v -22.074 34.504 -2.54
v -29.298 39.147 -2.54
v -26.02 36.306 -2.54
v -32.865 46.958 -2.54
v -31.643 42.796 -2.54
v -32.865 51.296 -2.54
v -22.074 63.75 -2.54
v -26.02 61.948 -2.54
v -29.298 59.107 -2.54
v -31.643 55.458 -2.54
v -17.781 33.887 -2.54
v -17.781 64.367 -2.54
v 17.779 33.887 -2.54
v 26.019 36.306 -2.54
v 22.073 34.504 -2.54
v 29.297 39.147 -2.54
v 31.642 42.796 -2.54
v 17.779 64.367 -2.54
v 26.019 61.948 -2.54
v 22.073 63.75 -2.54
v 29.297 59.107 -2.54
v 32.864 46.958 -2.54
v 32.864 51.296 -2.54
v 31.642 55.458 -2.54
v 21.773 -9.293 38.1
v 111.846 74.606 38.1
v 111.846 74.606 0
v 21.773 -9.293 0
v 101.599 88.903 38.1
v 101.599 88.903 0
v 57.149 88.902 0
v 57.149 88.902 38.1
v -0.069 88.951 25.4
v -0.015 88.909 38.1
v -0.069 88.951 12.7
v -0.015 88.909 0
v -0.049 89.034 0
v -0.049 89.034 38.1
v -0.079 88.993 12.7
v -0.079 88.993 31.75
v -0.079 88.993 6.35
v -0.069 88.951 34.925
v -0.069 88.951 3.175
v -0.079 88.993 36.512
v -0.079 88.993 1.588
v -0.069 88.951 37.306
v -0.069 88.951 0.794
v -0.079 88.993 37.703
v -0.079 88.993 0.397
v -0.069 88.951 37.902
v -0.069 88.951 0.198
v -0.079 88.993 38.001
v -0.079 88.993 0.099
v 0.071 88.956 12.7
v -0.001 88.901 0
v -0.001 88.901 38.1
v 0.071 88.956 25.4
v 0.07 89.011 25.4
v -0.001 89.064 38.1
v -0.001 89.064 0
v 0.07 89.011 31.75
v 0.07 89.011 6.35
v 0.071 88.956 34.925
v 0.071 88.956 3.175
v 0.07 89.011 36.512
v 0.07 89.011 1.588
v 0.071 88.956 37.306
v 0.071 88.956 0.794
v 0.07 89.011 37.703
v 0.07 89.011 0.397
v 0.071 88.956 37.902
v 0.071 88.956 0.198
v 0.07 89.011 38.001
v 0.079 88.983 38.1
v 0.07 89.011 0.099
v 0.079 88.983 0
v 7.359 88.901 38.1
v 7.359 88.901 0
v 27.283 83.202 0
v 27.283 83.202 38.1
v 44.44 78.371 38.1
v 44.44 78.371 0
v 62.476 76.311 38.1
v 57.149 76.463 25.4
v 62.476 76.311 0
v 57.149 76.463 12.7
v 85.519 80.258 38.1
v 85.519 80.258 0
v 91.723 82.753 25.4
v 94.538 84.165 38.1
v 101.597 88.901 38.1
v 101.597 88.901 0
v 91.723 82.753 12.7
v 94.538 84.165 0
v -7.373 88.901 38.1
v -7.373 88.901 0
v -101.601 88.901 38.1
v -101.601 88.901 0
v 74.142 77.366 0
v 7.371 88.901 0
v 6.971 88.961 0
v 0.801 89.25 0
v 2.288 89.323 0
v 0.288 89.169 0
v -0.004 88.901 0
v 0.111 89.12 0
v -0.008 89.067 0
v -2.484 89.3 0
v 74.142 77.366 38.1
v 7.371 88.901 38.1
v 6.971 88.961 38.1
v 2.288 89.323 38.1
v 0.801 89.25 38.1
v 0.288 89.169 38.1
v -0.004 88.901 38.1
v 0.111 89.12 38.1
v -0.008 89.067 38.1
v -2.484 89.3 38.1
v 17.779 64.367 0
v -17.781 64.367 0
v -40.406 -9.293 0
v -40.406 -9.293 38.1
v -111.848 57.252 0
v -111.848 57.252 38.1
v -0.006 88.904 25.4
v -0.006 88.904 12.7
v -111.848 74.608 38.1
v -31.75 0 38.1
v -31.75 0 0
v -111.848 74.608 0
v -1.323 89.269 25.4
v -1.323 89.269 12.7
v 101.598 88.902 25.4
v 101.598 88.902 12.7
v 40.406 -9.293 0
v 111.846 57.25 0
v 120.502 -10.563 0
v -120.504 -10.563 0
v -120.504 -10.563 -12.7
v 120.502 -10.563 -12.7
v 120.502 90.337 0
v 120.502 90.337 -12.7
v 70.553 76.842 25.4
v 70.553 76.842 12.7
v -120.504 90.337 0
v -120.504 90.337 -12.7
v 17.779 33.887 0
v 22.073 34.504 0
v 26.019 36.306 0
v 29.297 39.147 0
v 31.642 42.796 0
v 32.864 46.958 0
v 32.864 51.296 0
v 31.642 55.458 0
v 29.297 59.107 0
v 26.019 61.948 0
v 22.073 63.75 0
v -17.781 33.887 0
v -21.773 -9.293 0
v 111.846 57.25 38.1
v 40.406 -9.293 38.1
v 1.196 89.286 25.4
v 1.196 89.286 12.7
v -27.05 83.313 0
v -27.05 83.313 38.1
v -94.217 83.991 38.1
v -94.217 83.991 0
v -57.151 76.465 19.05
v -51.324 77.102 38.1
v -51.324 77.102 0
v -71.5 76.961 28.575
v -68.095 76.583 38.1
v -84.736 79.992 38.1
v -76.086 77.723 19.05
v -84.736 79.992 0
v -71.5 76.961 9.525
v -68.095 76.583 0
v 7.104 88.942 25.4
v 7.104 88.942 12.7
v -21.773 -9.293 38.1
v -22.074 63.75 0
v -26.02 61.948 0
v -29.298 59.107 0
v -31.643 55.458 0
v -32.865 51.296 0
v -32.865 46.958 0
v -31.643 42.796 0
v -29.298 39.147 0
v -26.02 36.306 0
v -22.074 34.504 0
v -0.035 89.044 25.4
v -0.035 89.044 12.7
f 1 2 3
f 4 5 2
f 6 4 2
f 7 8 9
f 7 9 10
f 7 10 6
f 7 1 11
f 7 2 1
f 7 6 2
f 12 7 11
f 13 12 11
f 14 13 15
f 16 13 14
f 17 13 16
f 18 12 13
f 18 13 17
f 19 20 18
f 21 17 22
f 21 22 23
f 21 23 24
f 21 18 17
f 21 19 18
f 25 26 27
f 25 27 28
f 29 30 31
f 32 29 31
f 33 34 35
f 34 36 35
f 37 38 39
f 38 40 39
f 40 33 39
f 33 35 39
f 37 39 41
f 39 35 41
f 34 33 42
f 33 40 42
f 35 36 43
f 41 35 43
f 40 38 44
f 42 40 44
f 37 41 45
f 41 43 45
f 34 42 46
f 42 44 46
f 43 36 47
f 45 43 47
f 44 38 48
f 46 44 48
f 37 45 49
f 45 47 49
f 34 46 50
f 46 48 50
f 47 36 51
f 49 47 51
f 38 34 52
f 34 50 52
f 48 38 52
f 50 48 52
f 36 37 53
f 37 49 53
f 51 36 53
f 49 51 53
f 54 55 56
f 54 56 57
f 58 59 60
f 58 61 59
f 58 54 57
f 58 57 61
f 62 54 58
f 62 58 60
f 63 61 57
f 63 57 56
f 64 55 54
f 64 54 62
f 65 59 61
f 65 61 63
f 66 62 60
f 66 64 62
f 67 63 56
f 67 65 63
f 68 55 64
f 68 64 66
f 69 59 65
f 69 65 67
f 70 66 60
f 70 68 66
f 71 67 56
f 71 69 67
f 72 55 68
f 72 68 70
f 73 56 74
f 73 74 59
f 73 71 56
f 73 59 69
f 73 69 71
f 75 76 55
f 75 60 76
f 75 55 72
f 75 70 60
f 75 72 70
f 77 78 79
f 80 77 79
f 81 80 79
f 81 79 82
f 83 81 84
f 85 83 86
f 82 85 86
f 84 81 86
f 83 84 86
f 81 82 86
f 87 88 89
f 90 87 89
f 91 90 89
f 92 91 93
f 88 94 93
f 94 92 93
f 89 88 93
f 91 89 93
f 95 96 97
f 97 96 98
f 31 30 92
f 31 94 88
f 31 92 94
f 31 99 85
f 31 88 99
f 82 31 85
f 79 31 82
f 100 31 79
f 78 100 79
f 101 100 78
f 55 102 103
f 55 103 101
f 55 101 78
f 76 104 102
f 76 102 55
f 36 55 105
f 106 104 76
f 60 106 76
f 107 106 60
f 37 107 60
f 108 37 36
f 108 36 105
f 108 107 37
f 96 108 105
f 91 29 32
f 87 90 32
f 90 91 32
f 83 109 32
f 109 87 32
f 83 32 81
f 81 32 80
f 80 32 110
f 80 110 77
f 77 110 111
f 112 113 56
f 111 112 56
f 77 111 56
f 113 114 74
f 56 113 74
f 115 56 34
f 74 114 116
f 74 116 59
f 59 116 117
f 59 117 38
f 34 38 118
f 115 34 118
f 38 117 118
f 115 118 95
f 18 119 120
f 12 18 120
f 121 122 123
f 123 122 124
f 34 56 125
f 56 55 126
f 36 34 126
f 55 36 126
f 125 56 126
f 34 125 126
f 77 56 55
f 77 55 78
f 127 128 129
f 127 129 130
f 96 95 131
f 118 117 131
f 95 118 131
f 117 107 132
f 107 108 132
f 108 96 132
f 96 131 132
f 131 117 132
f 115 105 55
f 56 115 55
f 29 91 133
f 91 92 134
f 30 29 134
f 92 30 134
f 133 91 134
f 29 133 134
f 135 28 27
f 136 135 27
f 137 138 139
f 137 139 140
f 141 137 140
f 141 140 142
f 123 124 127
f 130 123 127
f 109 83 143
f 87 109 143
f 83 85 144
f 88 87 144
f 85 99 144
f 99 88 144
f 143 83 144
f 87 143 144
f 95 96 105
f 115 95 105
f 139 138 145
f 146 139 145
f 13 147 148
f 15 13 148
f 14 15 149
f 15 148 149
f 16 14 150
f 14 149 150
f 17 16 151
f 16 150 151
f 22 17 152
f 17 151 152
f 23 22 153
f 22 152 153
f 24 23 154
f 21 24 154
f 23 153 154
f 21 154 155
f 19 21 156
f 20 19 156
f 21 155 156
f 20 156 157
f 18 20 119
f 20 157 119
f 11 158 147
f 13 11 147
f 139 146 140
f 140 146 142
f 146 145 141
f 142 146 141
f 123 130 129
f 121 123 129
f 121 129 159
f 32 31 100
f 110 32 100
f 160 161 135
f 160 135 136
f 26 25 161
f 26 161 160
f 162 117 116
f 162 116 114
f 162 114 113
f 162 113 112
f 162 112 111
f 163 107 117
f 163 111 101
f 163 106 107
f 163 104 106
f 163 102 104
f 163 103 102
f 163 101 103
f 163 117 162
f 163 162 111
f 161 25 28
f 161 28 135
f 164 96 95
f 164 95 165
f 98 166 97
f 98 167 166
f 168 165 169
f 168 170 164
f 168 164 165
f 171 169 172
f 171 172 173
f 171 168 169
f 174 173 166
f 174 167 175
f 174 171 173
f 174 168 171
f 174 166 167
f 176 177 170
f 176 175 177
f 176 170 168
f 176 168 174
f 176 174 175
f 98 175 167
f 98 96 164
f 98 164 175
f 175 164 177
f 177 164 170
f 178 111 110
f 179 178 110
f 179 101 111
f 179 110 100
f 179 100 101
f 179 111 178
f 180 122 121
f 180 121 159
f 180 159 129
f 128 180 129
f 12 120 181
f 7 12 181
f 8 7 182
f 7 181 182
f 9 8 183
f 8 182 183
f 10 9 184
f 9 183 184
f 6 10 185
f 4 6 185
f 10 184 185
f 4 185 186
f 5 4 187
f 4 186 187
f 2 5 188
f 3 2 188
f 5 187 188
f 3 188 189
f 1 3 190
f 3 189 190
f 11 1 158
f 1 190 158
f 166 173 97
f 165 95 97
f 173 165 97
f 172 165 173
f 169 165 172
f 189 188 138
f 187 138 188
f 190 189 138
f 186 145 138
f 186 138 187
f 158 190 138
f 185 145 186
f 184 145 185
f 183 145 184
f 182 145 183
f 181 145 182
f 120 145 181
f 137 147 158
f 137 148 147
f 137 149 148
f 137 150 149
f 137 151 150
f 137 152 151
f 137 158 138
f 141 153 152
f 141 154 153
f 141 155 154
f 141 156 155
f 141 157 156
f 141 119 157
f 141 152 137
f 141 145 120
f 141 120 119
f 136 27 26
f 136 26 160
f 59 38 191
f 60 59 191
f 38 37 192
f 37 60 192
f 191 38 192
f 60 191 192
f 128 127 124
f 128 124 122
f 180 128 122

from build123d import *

# Parameters (mm, degrees)
F1_DEPTH         = 38.1
F2_E3_MIRRORCS_W = 109.4597315367
F2_E3_MIRRORCS_H = 38.1
F3_DEPTH         = 12.7
F2_E1_W          = 109.4624810587
F2_E1_H          = 38.1
F4_DEPTH         = 12.7
F6_DEPTH         = 38.1
F8_DEPTH         = 38.1
F9_W             = 241.0063309582
F9_H             = 100.9000240942
F10_DEPTH        = 12.7
F12_DEPTH        = 2.54
F14_DEPTH        = 38.1
F16_DEPTH        = 38.1


with BuildPart() as f1:
    # F0 (on Top) → F1 (new body)
    with BuildSketch(Plane.XY):
        with BuildLine():
            add(Edge.make_bspline(
                [(-7.3731541722, 88.9010522698), (-19.31236057, 87.050708456), (-56.3966234299, 68.9261750439), (-92.6223703207, 81.2413929209), (-101.6011297031, 88.9010522698)],
                knots=[0.1289921189, 0.1289921189, 0.1289921189, 0.1289921189, 0.4692924446, 0.7920589848, 0.7920589848, 0.7920589848, 0.7920589848], degree=3))
            Line((-7.3731541722, 88.9010522698), (-57.1511297031, 88.9010522698))
            Line((-57.1511297031, 88.9010522698), (-101.6011297031, 88.9010522698))
        make_face()
        with BuildLine():
            add(Edge.make_bspline(
                [(-0.0011297031, 88.9010522698), (-0.0010471723, 88.901093798), (-0.0009647066, 88.9011353269), (-0.0008823061, 88.9011768563)],
                knots=[0, 0, 0, 0, 1.61298e-05, 1.61298e-05, 1.61298e-05, 1.61298e-05], degree=3))
            Line((-0.0011297031, 88.9010522698), (-0.0006349067, 88.9010522698))
            add(Edge.make_bspline(
                [(-0.0006349067, 88.9010522747), (-0.0007174383, 88.9010938013), (-0.0007999048, 88.9011353285), (-0.0008823061, 88.9011768563)],
                knots=[0, 0, 0, 0, 1.61298e-05, 1.61298e-05, 1.61298e-05, 1.61298e-05], degree=3))
        make_face()
        with BuildLine():
            Line((-0.0038189409, 88.9010522698), (-0.0011297031, 88.9010522698))
            add(Edge.make_bspline(
                [(-0.0011297031, 88.9010522698), (-0.0010471723, 88.901093798), (-0.0009647066, 88.9011353269), (-0.0008823061, 88.9011768563)],
                knots=[0, 0, 0, 0, 1.61298e-05, 1.61298e-05, 1.61298e-05, 1.61298e-05], degree=3))
            add(Edge.make_bspline(
                [(-0.0008823061, 88.9011768563), (-0.0059560813, 88.9037338865), (-0.0107828824, 88.9062931167), (-0.0153641459, 88.9088540413)],
                knots=[1.61298e-05, 1.61298e-05, 1.61298e-05, 1.61298e-05, 0.0010093075, 0.0010093075, 0.0010093075, 0.0010093075], degree=3))
            add(Edge.make_bspline(
                [(-0.0038189409, 88.9010522698), (-0.0078539791, 88.9036552478), (-0.0117020651, 88.9062559427), (-0.0153641459, 88.9088540413)],
                knots=[0.0002095209, 0.0002095209, 0.0002095209, 0.0002095209, 0.001082787, 0.001082787, 0.001082787, 0.001082787], degree=3))
        make_face()
        with BuildLine():
            Line((-7.3731541722, 88.9010522698), (-0.0038189409, 88.9010522698))
            add(Edge.make_bspline(
                [(-0.0038189409, 88.9010522698), (-0.0078539791, 88.9036552478), (-0.0117020651, 88.9062559427), (-0.0153641459, 88.9088540413)],
                knots=[0.0002095209, 0.0002095209, 0.0002095209, 0.0002095209, 0.001082787, 0.001082787, 0.001082787, 0.001082787], degree=3))
            add(Edge.make_bspline(
                [(-0.0153641459, 88.9088540413), (-0.0906066198, 88.9509145567), (-0.0996162199, 88.9934321228), (-0.0487573192, 89.0341663757)],
                knots=[0.0010093075, 0.0010093075, 0.0010093075, 0.0010093075, 0.0173212144, 0.0173212144, 0.0173212144, 0.0173212144], degree=3))
            add(Edge.make_bspline(
                [(-0.0487573192, 89.0341663757), (-0.0385667228, 89.045259585), (-0.0248162276, 89.0561903305), (-0.0075963078, 89.0669286912)],
                knots=[0.0155197372, 0.0155197372, 0.0155197372, 0.0155197372, 0.0195117913, 0.0195117913, 0.0195117913, 0.0195117913], degree=3))
            add(Edge.make_bspline(
                [(-0.0075963078, 89.0669286912), (-0.5527500342, 89.3272580379), (-3.6107471198, 89.4841518814), (-7.3731541722, 88.9010522698)],
                knots=[0.0217531364, 0.0217531364, 0.0217531364, 0.0217531364, 0.1289921189, 0.1289921189, 0.1289921189, 0.1289921189], degree=3))
        make_face()
        with BuildLine():
            Line((7.358503656, 88.9011983473), (-0.0006349067, 88.9010522747))
            Line((-0.0006349067, 88.9010522698), (7.3594185793, 88.9010522698))
            add(Edge.make_bspline(
                [(7.358503656, 88.9011983473), (7.3588086257, 88.9011496596), (7.3591136001, 88.9011009671), (7.3594185793, 88.9010522698)],
                knots=[0.1288715075, 0.1288715075, 0.1288715075, 0.1288715075, 0.1288802405, 0.1288802405, 0.1288802405, 0.1288802405], degree=3))
        make_face()
        with BuildLine():
            add(Edge.make_bspline(
                [(-0.0006349067, 88.9010522747), (-0.0007174383, 88.9010938013), (-0.0007999048, 88.9011353285), (-0.0008823061, 88.9011768563)],
                knots=[0, 0, 0, 0, 1.61298e-05, 1.61298e-05, 1.61298e-05, 1.61298e-05], degree=3))
            Line((-0.0006349067, 88.9010522747), (7.358503656, 88.9011983473))
            add(Edge.make_bspline(
                [(6.9707545503, 88.9609054579), (7.0990916617, 88.9418687773), (7.2283658962, 88.9219745203), (7.358503656, 88.9011983473)],
                knots=[0.1251449345, 0.1251449345, 0.1251449345, 0.1251449345, 0.1288715075, 0.1288715075, 0.1288715075, 0.1288715075], degree=3))
            add(Edge.make_bspline(
                [(-0.0008839186, 89.0636547943), (0.5066620671, 89.3166069603), (3.3780640661, 89.4750941094), (6.9707545503, 88.9609054579)],
                knots=[0.0213043311, 0.0213043311, 0.0213043311, 0.0213043311, 0.1251592971, 0.1251592971, 0.1251592971, 0.1251592971], degree=3))
            add(Edge.make_bspline(
                [(-0.0008823061, 88.9011768563), (0.1078701091, 88.9559875108), (0.1031539373, 89.0118066991), (-0.0008839186, 89.0636547943)],
                knots=[1.61298e-05, 1.61298e-05, 1.61298e-05, 1.61298e-05, 0.0213043311, 0.0213043311, 0.0213043311, 0.0213043311], degree=3))
        make_face()
        with BuildLine():
            add(Edge.make_bspline(
                [(7.358503656, 88.9011983473), (7.3588086257, 88.9011496596), (7.3591136001, 88.9011009671), (7.3594185793, 88.9010522698)],
                knots=[0.1288715075, 0.1288715075, 0.1288715075, 0.1288715075, 0.1288802405, 0.1288802405, 0.1288802405, 0.1288802405], degree=3))
            Line((7.3594185793, 88.9010522698), (7.372333804, 88.9010522698))
            add(Edge.make_bspline(
                [(7.371389561, 88.901198603), (7.3717043037, 88.9011498305), (7.3720190514, 88.9011010527), (7.372333804, 88.9010522698)],
                knots=[0.1289921189, 0.1289921189, 0.1289921189, 0.1289921189, 0.1290010899, 0.1290010899, 0.1290010899, 0.1290010899], degree=3))
            Line((7.371389561, 88.901198603), (7.358503656, 88.9011983473))
        make_face()
        with BuildLine():
            Line((7.372333804, 88.9010522698), (7.3594185793, 88.9010522698))
            add(Edge.make_bspline(
                [(7.3594185793, 88.9010522698), (7.3633256696, 88.9004284077), (19.2537900005, 86.9997857358), (40.134248152, 76.8571245778), (60.7081186709, 76.2938170337), (62.4758923018, 76.3111989879)],
                knots=[0.1288802405, 0.1288802405, 0.1288802405, 0.1288802405, 0.1289921189, 0.4692924446, 0.5014907397, 0.5014907397, 0.5014907397, 0.5014907397], degree=3))
            add(Edge.make_bspline(
                [(7.372333804, 88.9010522698), (19.311636162, 87.0506013639), (40.1454385751, 76.8690456691), (60.7080947753, 76.2945495342), (62.4758923018, 76.3111989879)],
                knots=[0.1290010899, 0.1290010899, 0.1290010899, 0.1290010899, 0.4692924446, 0.5015061184, 0.5015061184, 0.5015061184, 0.5015061184], degree=3))
        make_face()
        with BuildLine():
            add(Edge.make_bspline(
                [(6.9707545503, 88.9609054579), (7.0990916617, 88.9418687773), (7.2283658962, 88.9219745203), (7.358503656, 88.9011983473)],
                knots=[0.1251449345, 0.1251449345, 0.1251449345, 0.1251449345, 0.1288715075, 0.1288715075, 0.1288715075, 0.1288715075], degree=3))
            Line((7.358503656, 88.9011983473), (7.371389561, 88.901198603))
            add(Edge.make_bspline(
                [(6.9707545503, 88.9609054579), (7.103344668, 88.9419290573), (7.2369171933, 88.9220364605), (7.371389561, 88.901198603)],
                knots=[0.1251592971, 0.1251592971, 0.1251592971, 0.1251592971, 0.1289921189, 0.1289921189, 0.1289921189, 0.1289921189], degree=3))
        make_face()
        with BuildLine():
            add(Edge.make_bspline(
                [(-0.0487573192, 89.0341663757), (-0.0363383579, 89.0441130537), (-0.0203496698, 89.0539533996), (-0.0008839186, 89.0636547943)],
                knots=[0.0173212144, 0.0173212144, 0.0173212144, 0.0173212144, 0.0213043311, 0.0213043311, 0.0213043311, 0.0213043311], degree=3))
            add(Edge.make_bspline(
                [(-0.0008839186, 89.0636547943), (-0.0030772808, 89.0647478738), (-0.0053147881, 89.0658391883), (-0.0075963078, 89.0669286912)],
                knots=[0.0213043311, 0.0213043311, 0.0213043311, 0.0213043311, 0.0217531364, 0.0217531364, 0.0217531364, 0.0217531364], degree=3))
            add(Edge.make_bspline(
                [(-0.0487573192, 89.0341663757), (-0.0385667228, 89.045259585), (-0.0248162276, 89.0561903305), (-0.0075963078, 89.0669286912)],
                knots=[0.0155197372, 0.0155197372, 0.0155197372, 0.0155197372, 0.0195117913, 0.0195117913, 0.0195117913, 0.0195117913], degree=3))
        make_face()
        with BuildLine():
            add(Edge.make_bspline(
                [(-0.0008839186, 89.0636547943), (-0.0030772808, 89.0647478738), (-0.0053147881, 89.0658391883), (-0.0075963078, 89.0669286912)],
                knots=[0.0213043311, 0.0213043311, 0.0213043311, 0.0213043311, 0.0217531364, 0.0217531364, 0.0217531364, 0.0217531364], degree=3))
            add(Edge.make_bspline(
                [(-0.0008839186, 89.0636547943), (0.5066620671, 89.3166069603), (3.3780640661, 89.4750941094), (6.9707545503, 88.9609054579)],
                knots=[0.0213043311, 0.0213043311, 0.0213043311, 0.0213043311, 0.1251592971, 0.1251592971, 0.1251592971, 0.1251592971], degree=3))
            add(Edge.make_bspline(
                [(-0.0075963078, 89.0669286912), (0.4480573981, 89.3510748377), (3.3329208845, 89.5005177095), (6.9707545503, 88.9609054579)],
                knots=[0.0195117913, 0.0195117913, 0.0195117913, 0.0195117913, 0.1251449345, 0.1251449345, 0.1251449345, 0.1251449345], degree=3))
        make_face()
        with BuildLine():
            add(Edge.make_bspline(
                [(7.371389561, 88.901198603), (7.3717043037, 88.9011498305), (7.3720190514, 88.9011010527), (7.372333804, 88.9010522698)],
                knots=[0.1289921189, 0.1289921189, 0.1289921189, 0.1289921189, 0.1290010899, 0.1290010899, 0.1290010899, 0.1290010899], degree=3))
            Line((7.372333804, 88.9010522698), (57.1488702969, 88.9010522698))
            Line((57.1488702969, 88.9010522698), (101.5970009453, 88.9010522698))
            add(Edge.make_bspline(
                [(101.5970009453, 88.9010522698), (101.5977890547, 88.9017244829), (101.5985770973, 88.9023967089), (101.5993650733, 88.9030689477)],
                knots=[0.7920306583, 0.7920306583, 0.7920306583, 0.7920306583, 0.7920589848, 0.7920589848, 0.7920589848, 0.7920589848], degree=3))
            Line((101.5993650733, 88.9030689477), (57.1493650821, 88.9021866532))
            Line((57.1493650821, 88.9021866532), (7.371389561, 88.901198603))
        make_face()
        with BuildLine():
            Line((57.1488702969, 88.9010522698), (7.372333804, 88.9010522698))
            add(Edge.make_bspline(
                [(7.372333804, 88.9010522698), (19.311636162, 87.0506013639), (40.1454385751, 76.8690456691), (60.7080947753, 76.2945495342), (62.4758923018, 76.3111989879)],
                knots=[0.1290010899, 0.1290010899, 0.1290010899, 0.1290010899, 0.4692924446, 0.5015061184, 0.5015061184, 0.5015061184, 0.5015061184], degree=3))
            add(Edge.make_bspline(
                [(62.4758923018, 76.3111989879), (70.6608896738, 76.3916794562), (78.6185391976, 77.8886425606), (85.5189213309, 80.2584115087)],
                knots=[0.5014907397, 0.5014907397, 0.5014907397, 0.5014907397, 0.6505725884, 0.6505725884, 0.6505725884, 0.6505725884], degree=3))
            add(Edge.make_bspline(
                [(85.5189213309, 80.2584115087), (92.0658589973, 82.5084423933), (97.6622116963, 85.5448972365), (101.5970009453, 88.9010522698)],
                knots=[0.650605221, 0.650605221, 0.650605221, 0.650605221, 0.7920306583, 0.7920306583, 0.7920306583, 0.7920306583], degree=3))
            Line((101.5970009453, 88.9010522698), (57.1488702969, 88.9010522698))
        make_face()
        with BuildLine():
            add(Edge.make_bspline(
                [(62.4758923018, 76.3111989879), (70.6608896738, 76.3916794562), (78.6185391976, 77.8886425606), (85.5189213309, 80.2584115087)],
                knots=[0.5014907397, 0.5014907397, 0.5014907397, 0.5014907397, 0.6505725884, 0.6505725884, 0.6505725884, 0.6505725884], degree=3))
            add(Edge.make_bspline(
                [(62.4758923018, 76.3111989879), (70.6580396422, 76.3882600096), (78.6167504823, 77.8862952047), (85.5189213309, 80.2584115087)],
                knots=[0.5015061184, 0.5015061184, 0.5015061184, 0.5015061184, 0.650605221, 0.650605221, 0.650605221, 0.650605221], degree=3))
        make_face()
    extrude(amount=F1_DEPTH)


with BuildPart() as f3:
    # F2_E3_MirrorCS (on explicit) → F3 (new body)
    with BuildSketch(Plane(origin=(31.75, 0, 0), x_dir=(0.7317397952, 0.6815840902, 0), z_dir=(0.6815840902, -0.7317397952, 0))):
        with Locations((54.7298657684, 19.05)):
            Rectangle(F2_E3_MIRRORCS_W, F2_E3_MIRRORCS_H)
    extrude(amount=F3_DEPTH)

    # F7 (on face) → F8 (join)
    with BuildSketch(Plane.XY.offset(38.1)):
        Polygon((40.406117946, -9.2930953996), (31.75, 0), (21.7730539089, -9.2930953996), align=None)
    extrude(amount=-F8_DEPTH)

    # F15 (on face) → F16 (cut)
    with BuildSketch(Plane.XY.offset(38.1)):
        Polygon((120.5021594878, 65.3129161372), (111.8460415418, 74.6060115367), (111.8460415418, 57.2501152433), align=None)
    extrude(amount=-F16_DEPTH, mode=Mode.SUBTRACT)


with BuildPart() as f4:
    # F2_E1 (on explicit) → F4 (new body)
    with BuildSketch(Plane(origin=(-31.75, 0, 0), x_dir=(-0.7317397957, 0.6815840897, 0), z_dir=(0.6815840897, 0.7317397957, 0))):
        with Locations((54.7312405293, 19.05)):
            Rectangle(F2_E1_W, F2_E1_H)
    extrude(amount=-F4_DEPTH)

    # F5 (on face) → F6 (join)
    with BuildSketch(Plane.XY.offset(38.1)):
        Polygon((-21.7730538874, -9.2930954059), (-31.75, 0), (-40.4061179392, -9.2930954059), align=None)
    extrude(amount=-F6_DEPTH)

    # F13 (on face) → F14 (cut)
    with BuildSketch(Plane.XY.offset(38.1)):
        Polygon((-111.8480535312, 57.2519892268), (-111.8480535312, 74.6078855084), (-120.5041714704, 65.3147901024), align=None)
    extrude(amount=-F14_DEPTH, mode=Mode.SUBTRACT)


with BuildPart() as f10:
    # F9 (on Top) → F10 (new body)
    with BuildSketch(Plane.XY):
        with Locations((-0.0010059913, 39.8869166412)):
            Rectangle(F9_W, F9_H)
    extrude(amount=-F10_DEPTH)

    # F11 (on face) → F12 (cut)
    with BuildSketch(Plane.XY):
        with BuildLine():
            Line((-17.7805990966, 33.8869045941), (-0.0004435264, 33.8869045941))
            Line((-0.0004435264, 33.8869045941), (-0.0008424617, 64.3669045941))
            Line((-0.0008424617, 64.3669045941), (-17.7805990966, 64.3669045941))
            ThreePointArc((-17.7805990966, 64.3669045941), (-33.0205990966, 49.1269045941), (-17.7805990966, 33.8869045941))
        make_face()
        with BuildLine():
            Line((-0.0008424617, 64.3669045941), (-0.0004435264, 33.8869045941))
            Line((-0.0004435264, 33.8869045941), (17.7794009034, 33.8869045941))
            ThreePointArc((17.7794009034, 33.8869045941), (33.0194009034, 49.1269045941), (17.7794009034, 64.3669045941))
            Line((17.7794009034, 64.3669045941), (-0.0008424617, 64.3669045941))
        make_face()
    extrude(amount=-F12_DEPTH, mode=Mode.SUBTRACT)


solid = Compound([f1.part, f3.part, f4.part, f10.part])
